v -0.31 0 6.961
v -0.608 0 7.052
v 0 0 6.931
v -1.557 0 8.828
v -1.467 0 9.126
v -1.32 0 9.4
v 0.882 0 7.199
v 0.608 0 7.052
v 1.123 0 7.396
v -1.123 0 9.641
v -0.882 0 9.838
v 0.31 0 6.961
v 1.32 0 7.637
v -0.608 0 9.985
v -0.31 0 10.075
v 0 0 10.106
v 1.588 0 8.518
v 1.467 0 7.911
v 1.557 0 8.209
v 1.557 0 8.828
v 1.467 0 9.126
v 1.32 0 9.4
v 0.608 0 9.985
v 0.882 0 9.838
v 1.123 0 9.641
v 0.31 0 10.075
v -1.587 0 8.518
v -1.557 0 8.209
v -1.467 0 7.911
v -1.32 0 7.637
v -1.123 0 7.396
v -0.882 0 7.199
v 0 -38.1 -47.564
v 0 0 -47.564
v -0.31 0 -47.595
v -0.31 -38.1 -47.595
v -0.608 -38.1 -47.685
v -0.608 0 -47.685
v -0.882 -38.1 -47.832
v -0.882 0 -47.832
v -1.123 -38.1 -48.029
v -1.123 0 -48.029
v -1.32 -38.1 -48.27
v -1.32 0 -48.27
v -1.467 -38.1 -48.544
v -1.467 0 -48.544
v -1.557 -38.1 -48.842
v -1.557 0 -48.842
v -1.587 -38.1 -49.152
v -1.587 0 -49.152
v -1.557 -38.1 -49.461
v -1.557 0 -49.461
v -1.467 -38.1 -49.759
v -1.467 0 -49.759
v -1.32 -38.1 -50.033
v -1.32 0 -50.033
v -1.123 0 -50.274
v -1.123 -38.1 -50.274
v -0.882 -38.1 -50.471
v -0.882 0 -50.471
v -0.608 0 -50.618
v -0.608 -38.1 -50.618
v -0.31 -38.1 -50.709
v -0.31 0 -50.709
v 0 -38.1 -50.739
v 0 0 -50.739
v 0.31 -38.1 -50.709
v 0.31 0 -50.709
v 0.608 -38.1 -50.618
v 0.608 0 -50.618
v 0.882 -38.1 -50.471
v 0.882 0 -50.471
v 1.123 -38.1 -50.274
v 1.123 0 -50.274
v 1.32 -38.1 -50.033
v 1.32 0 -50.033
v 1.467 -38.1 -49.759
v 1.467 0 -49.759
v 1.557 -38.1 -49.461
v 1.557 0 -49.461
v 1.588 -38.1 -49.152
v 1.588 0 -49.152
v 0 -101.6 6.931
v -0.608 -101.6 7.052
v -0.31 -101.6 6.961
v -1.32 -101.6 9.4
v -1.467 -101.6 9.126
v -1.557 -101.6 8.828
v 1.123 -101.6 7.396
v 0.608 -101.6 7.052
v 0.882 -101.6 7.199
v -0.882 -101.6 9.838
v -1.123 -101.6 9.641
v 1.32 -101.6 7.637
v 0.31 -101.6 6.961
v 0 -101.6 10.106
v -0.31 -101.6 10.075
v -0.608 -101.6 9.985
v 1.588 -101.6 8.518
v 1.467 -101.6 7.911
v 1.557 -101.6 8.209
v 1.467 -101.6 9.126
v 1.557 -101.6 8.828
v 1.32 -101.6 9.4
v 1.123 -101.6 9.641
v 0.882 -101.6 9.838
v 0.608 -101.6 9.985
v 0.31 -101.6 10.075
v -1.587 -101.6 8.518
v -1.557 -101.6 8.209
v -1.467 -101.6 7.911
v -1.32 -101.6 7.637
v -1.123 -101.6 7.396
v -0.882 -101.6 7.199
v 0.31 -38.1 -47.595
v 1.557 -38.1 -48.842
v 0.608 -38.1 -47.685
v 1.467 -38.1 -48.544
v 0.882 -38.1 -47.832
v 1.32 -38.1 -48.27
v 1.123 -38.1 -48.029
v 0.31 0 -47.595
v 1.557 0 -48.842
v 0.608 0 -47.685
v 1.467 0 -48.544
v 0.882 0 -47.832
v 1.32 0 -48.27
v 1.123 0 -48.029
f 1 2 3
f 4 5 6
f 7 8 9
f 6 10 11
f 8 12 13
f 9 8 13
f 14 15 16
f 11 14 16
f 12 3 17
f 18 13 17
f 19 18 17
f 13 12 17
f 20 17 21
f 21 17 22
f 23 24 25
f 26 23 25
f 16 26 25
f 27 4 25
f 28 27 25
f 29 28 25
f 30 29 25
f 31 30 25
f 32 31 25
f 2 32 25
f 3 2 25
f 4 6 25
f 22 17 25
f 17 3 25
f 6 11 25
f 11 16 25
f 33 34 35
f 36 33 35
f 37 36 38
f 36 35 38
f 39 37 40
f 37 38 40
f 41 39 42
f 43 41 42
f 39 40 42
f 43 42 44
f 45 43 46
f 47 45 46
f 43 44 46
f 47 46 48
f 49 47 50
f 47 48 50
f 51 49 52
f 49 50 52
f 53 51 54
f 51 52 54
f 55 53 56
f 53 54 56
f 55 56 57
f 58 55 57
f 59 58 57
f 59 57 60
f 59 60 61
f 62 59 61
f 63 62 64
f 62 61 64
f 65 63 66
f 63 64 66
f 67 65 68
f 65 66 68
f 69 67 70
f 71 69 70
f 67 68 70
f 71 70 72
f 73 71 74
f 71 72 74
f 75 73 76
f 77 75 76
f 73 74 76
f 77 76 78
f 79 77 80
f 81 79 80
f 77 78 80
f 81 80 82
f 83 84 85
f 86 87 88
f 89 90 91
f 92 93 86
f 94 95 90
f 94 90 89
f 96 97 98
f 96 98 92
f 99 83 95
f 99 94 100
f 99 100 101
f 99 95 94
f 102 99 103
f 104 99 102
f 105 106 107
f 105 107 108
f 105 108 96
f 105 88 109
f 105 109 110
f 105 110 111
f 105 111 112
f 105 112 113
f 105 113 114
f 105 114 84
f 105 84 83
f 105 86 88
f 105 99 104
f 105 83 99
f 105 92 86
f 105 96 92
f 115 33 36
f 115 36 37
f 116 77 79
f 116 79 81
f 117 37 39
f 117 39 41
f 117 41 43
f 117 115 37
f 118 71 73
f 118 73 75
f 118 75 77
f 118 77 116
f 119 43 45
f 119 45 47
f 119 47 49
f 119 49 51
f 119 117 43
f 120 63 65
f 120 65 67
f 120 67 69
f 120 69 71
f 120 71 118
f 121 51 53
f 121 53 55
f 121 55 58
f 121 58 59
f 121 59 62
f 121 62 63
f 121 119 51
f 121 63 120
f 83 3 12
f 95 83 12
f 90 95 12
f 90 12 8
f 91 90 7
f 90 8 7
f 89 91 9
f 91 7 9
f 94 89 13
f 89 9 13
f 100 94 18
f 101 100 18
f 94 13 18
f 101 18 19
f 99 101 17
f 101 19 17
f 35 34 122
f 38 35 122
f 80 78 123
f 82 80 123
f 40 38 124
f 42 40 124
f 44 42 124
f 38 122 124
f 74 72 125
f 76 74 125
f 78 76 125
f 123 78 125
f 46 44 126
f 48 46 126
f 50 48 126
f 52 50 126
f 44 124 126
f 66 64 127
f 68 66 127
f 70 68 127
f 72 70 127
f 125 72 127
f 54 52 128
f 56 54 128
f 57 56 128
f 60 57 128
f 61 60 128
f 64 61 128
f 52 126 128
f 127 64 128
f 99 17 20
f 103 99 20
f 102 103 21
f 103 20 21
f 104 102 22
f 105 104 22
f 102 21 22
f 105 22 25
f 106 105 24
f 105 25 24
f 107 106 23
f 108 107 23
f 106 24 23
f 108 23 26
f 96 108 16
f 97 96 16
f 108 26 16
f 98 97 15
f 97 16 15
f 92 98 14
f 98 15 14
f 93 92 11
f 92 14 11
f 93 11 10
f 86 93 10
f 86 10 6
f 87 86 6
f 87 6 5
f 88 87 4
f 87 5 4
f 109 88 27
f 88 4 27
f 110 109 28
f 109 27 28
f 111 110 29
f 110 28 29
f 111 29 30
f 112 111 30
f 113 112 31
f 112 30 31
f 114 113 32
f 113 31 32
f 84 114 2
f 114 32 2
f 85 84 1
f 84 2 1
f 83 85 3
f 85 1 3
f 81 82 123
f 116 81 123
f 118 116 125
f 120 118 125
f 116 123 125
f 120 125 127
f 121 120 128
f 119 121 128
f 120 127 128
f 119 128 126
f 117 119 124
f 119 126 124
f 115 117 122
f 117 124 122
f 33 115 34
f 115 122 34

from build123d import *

# Parameters (mm, degrees)
F1_DEPTH = 101.6
F2_DEPTH = 38.1


# Not quite as in the source:
# - the program builds the solid bodies; features that only make, move or delete a surface that nothing else refers to are left out


with BuildPart() as f1:
    # F0 (on Front) → F1 (new body)
    with BuildSketch(Plane.XZ):
        with BuildLine():
            ThreePointArc((1.5875, 8.5184694223), (-1.1225320151, 9.6410014374), (0, 6.9309694223))
            ThreePointArc((0, 6.9309694223), (1.1225320151, 7.3959374071), (1.5875, 8.5184694223))
        make_face()
    extrude(amount=F1_DEPTH)


with BuildPart() as f2:
    # F0 (on Front) → F2 (new body)
    with BuildSketch(Plane.XZ):
        with BuildLine():
            ThreePointArc((1.5875, -49.1515211761), (1.1225320151, -48.028989161), (0, -47.5640211761))
            ThreePointArc((0, -47.5640211761), (-1.1225320151, -50.2740531912), (1.5875, -49.1515211761))
        make_face()
    extrude(amount=F2_DEPTH)


solid = Compound([f1.part, f2.part])
